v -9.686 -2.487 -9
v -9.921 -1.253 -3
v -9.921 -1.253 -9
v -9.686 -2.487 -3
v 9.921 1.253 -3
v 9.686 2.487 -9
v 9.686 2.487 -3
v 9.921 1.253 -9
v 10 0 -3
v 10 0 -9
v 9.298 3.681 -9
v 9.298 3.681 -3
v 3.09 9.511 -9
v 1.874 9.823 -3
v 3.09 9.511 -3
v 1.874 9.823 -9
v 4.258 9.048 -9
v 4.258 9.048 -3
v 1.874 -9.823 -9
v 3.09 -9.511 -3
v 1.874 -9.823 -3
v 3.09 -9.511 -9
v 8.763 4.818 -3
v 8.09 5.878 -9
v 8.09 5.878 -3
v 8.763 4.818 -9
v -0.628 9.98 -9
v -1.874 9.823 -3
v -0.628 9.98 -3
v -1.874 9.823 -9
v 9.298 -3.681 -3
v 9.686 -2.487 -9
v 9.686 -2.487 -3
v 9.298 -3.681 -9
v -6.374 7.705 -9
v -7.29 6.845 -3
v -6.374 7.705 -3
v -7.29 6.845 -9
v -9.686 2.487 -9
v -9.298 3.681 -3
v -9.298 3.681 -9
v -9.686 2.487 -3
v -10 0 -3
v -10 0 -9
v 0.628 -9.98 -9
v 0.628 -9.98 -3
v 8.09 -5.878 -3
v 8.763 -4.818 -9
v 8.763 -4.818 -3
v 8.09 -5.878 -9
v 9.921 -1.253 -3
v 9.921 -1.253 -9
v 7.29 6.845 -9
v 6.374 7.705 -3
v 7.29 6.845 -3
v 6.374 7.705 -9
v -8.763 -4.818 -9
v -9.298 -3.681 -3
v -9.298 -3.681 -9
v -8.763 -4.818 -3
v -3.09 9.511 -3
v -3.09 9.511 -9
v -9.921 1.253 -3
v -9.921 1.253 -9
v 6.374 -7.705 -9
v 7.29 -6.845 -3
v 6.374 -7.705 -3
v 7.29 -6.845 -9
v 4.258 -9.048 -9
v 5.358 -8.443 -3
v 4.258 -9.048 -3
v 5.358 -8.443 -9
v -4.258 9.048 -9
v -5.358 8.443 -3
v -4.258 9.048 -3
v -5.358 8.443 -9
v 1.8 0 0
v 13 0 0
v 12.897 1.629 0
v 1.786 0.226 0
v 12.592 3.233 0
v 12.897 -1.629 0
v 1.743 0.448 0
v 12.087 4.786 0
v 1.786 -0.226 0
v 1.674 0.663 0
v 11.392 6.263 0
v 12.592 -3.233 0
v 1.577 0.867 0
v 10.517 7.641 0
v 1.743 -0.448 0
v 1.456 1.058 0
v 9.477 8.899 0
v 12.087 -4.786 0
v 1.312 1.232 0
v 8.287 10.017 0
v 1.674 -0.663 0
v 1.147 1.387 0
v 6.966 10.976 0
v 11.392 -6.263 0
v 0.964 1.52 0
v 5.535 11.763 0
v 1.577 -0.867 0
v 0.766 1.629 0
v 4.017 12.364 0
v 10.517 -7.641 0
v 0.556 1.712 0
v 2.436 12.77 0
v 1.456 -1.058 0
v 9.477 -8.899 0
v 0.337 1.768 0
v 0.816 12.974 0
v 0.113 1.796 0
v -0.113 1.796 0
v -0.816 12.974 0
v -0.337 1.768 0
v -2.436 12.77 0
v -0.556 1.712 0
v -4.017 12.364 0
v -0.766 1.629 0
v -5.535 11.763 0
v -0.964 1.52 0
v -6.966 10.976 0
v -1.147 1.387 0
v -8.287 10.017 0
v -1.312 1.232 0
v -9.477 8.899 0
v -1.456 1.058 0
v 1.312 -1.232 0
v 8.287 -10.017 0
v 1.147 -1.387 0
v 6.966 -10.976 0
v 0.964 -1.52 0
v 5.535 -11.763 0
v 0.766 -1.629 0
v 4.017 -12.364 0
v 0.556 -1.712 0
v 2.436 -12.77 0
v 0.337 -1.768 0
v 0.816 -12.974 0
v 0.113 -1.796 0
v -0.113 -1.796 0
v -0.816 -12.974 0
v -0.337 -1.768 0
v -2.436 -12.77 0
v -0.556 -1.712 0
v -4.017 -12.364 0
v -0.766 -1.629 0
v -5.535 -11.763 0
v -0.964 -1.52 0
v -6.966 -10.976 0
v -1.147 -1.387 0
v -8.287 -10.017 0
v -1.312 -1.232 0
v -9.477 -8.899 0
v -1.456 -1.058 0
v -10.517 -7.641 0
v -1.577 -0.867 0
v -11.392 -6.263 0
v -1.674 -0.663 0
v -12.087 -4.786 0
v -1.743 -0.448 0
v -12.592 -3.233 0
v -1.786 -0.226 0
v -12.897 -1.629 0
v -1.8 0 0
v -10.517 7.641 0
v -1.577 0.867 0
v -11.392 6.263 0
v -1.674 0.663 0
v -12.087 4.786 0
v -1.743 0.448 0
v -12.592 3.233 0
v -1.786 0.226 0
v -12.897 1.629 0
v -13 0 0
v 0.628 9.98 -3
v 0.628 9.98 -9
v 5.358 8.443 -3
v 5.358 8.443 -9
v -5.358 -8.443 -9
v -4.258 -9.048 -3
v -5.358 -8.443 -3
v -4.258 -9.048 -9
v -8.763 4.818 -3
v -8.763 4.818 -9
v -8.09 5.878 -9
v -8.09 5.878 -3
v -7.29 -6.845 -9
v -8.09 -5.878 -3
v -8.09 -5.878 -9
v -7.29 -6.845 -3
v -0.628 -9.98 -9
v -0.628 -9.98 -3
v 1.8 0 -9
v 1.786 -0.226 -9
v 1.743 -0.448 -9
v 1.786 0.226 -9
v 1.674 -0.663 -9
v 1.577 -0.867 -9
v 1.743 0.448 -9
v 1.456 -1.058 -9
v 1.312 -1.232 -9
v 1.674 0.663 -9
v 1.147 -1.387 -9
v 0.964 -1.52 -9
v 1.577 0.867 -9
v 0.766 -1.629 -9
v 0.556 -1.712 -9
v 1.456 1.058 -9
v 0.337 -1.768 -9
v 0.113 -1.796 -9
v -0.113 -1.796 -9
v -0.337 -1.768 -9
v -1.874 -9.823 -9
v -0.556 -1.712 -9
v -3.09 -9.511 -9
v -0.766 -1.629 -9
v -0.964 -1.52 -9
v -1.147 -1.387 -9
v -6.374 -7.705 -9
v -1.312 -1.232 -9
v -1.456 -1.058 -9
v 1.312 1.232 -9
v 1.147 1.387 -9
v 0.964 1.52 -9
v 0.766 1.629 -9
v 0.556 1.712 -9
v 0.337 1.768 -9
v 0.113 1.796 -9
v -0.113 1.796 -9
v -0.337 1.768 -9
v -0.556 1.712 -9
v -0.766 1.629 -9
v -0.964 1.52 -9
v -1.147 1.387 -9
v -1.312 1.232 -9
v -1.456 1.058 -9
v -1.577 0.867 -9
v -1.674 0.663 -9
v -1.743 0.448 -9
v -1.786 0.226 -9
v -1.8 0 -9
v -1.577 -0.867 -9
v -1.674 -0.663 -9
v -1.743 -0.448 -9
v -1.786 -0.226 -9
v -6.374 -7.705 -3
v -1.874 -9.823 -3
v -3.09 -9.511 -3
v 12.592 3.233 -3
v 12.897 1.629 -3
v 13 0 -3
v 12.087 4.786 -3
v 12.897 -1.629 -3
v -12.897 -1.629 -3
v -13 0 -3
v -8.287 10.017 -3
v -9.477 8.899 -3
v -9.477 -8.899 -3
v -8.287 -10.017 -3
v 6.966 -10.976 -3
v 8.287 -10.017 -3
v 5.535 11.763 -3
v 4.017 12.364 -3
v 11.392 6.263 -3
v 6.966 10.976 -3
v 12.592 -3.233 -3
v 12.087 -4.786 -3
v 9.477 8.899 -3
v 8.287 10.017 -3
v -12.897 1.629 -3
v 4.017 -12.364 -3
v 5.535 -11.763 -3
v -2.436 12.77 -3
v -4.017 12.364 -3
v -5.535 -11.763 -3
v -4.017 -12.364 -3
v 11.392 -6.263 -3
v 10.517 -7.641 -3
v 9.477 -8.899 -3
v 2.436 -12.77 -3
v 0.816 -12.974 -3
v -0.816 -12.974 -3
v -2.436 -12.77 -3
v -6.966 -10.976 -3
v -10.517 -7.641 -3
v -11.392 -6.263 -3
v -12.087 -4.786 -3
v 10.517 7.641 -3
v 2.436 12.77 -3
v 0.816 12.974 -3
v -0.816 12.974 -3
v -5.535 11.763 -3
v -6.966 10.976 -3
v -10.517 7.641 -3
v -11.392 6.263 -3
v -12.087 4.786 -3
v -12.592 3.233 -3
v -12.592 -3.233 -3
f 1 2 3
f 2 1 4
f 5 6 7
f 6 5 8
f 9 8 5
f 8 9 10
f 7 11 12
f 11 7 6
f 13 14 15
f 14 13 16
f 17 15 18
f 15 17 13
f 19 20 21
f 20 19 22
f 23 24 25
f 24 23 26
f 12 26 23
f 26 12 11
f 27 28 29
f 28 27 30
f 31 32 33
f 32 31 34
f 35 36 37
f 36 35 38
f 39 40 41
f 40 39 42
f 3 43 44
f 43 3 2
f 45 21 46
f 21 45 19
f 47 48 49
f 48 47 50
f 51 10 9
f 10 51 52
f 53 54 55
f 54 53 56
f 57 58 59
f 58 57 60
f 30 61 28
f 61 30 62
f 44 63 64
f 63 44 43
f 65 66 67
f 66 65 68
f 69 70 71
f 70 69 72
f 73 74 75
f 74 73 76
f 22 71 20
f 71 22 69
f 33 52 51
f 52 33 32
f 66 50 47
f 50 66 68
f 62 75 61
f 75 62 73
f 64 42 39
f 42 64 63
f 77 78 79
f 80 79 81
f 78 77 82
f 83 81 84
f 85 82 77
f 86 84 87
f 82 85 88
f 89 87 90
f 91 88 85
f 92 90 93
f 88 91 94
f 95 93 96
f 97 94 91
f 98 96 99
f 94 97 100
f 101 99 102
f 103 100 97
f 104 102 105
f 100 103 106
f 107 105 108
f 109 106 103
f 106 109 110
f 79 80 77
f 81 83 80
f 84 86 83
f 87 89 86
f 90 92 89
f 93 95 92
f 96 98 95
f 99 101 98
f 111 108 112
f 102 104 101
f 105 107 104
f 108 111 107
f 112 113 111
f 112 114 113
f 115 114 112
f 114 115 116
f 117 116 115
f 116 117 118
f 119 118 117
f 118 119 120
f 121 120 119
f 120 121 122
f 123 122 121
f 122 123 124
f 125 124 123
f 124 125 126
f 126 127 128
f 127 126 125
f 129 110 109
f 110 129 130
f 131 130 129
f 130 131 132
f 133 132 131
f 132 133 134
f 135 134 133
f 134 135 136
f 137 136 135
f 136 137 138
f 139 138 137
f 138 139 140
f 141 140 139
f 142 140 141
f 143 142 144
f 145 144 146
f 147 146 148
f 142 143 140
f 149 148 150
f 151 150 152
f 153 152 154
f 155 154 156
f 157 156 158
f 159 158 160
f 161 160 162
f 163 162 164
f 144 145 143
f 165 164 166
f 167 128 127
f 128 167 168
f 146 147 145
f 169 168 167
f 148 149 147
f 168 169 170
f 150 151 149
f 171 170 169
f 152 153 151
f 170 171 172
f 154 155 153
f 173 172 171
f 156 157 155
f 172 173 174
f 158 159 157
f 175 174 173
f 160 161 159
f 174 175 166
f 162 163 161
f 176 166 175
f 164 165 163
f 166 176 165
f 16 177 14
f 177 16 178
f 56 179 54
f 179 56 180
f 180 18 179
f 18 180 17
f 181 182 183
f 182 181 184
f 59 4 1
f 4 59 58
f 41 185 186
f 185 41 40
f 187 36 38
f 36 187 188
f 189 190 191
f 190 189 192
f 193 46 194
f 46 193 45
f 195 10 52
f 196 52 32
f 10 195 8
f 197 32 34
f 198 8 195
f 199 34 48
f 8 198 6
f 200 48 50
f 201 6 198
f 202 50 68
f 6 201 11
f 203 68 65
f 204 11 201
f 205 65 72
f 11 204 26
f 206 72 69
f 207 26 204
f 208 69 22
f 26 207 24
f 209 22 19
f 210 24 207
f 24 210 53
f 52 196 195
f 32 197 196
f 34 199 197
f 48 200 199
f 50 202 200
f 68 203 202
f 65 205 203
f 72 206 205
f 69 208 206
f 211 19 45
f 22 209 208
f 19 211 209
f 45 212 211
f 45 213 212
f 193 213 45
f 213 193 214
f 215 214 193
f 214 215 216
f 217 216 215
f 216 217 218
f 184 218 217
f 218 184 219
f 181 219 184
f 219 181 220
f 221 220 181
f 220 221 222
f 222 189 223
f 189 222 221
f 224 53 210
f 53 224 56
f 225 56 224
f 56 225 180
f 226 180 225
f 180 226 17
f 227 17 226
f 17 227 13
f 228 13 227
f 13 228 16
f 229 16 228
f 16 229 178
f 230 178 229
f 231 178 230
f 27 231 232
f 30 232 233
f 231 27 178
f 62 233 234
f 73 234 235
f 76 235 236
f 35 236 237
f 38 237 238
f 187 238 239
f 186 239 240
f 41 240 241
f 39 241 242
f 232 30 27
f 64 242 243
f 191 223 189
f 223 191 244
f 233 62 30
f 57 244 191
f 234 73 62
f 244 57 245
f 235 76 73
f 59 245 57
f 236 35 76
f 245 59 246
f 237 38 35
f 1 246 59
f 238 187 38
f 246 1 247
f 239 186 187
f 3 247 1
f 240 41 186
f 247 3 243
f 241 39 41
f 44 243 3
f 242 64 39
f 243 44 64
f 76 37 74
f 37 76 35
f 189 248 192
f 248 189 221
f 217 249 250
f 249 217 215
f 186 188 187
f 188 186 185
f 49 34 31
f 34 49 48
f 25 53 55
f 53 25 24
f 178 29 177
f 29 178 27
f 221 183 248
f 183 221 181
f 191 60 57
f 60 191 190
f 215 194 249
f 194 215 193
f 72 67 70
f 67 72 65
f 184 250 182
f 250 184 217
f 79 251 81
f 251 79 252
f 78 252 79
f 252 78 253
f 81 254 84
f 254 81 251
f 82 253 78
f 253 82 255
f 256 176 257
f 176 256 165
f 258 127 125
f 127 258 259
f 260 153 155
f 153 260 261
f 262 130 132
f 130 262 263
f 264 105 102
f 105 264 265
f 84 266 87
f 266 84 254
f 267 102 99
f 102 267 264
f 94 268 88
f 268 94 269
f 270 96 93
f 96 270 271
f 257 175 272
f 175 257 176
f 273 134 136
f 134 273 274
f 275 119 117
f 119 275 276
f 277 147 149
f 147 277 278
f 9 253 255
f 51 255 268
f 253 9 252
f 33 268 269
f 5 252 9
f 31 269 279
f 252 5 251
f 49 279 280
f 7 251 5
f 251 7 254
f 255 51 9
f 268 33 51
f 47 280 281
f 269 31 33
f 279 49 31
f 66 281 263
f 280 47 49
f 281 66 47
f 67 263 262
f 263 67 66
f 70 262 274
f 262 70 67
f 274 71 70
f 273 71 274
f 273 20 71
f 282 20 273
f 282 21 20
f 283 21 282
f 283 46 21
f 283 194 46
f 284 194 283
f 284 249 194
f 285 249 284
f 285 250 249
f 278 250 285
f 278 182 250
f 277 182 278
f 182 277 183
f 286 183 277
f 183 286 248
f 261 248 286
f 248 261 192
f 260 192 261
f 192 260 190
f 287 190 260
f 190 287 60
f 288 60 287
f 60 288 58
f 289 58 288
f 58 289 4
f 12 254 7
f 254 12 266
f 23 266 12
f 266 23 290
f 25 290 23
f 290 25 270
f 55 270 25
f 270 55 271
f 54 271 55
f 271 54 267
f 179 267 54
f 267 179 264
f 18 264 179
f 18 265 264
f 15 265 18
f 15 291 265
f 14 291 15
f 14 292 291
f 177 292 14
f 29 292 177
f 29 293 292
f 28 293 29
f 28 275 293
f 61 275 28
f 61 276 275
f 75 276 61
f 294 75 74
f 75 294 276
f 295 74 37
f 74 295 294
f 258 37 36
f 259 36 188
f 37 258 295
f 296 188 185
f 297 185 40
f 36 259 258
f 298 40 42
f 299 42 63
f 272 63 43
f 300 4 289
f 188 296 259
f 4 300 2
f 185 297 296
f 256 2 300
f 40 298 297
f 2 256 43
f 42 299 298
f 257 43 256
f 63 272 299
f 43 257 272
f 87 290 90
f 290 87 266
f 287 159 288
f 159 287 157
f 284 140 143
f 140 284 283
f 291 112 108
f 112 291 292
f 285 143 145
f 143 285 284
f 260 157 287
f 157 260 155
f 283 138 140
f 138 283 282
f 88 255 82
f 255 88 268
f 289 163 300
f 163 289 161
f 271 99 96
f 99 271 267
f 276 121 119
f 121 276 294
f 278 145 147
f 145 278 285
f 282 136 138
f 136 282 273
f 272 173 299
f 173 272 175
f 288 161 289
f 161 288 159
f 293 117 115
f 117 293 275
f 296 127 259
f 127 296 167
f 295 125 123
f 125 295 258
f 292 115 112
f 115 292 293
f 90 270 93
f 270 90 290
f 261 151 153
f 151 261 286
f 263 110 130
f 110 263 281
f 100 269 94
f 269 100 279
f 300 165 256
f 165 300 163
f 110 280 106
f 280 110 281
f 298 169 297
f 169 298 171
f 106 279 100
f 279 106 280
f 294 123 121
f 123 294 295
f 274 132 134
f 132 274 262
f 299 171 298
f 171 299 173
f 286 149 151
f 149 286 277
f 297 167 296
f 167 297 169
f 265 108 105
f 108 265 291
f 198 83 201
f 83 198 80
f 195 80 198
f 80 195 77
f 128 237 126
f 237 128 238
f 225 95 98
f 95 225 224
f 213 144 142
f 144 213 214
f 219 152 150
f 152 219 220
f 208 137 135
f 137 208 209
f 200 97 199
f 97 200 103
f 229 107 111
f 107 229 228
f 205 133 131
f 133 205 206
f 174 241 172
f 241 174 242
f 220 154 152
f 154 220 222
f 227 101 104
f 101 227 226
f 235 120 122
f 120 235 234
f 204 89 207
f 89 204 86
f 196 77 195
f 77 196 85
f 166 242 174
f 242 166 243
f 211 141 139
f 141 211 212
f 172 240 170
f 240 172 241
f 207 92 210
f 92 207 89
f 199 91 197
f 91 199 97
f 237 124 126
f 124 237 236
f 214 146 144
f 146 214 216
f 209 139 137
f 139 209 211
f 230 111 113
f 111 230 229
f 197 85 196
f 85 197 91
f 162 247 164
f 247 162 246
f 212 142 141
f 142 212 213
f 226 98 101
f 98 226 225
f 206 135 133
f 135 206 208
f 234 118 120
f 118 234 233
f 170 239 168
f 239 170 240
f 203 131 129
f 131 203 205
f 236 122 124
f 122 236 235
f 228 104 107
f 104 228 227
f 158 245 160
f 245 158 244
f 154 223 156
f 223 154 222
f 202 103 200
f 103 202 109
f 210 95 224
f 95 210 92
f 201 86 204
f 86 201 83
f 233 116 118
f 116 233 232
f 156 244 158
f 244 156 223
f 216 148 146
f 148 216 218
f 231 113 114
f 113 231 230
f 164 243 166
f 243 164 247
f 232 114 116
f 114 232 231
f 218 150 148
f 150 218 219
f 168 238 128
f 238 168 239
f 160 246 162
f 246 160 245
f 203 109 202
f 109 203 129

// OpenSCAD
$fn = 50;


difference() {
	union() {
		translate(v = [0, 0, -9.0000000000]) {
			cylinder(h = 9, r = 10.0000000000);
		}
		translate(v = [0, 0, -3.0000000000]) {
			cylinder(h = 3, r = 13.0000000000);
		}
	}
	union() {
		#translate(v = [0, 0, -9]) {
			cylinder(h = 9, r = 1.8000000000);
		}
	}
}
